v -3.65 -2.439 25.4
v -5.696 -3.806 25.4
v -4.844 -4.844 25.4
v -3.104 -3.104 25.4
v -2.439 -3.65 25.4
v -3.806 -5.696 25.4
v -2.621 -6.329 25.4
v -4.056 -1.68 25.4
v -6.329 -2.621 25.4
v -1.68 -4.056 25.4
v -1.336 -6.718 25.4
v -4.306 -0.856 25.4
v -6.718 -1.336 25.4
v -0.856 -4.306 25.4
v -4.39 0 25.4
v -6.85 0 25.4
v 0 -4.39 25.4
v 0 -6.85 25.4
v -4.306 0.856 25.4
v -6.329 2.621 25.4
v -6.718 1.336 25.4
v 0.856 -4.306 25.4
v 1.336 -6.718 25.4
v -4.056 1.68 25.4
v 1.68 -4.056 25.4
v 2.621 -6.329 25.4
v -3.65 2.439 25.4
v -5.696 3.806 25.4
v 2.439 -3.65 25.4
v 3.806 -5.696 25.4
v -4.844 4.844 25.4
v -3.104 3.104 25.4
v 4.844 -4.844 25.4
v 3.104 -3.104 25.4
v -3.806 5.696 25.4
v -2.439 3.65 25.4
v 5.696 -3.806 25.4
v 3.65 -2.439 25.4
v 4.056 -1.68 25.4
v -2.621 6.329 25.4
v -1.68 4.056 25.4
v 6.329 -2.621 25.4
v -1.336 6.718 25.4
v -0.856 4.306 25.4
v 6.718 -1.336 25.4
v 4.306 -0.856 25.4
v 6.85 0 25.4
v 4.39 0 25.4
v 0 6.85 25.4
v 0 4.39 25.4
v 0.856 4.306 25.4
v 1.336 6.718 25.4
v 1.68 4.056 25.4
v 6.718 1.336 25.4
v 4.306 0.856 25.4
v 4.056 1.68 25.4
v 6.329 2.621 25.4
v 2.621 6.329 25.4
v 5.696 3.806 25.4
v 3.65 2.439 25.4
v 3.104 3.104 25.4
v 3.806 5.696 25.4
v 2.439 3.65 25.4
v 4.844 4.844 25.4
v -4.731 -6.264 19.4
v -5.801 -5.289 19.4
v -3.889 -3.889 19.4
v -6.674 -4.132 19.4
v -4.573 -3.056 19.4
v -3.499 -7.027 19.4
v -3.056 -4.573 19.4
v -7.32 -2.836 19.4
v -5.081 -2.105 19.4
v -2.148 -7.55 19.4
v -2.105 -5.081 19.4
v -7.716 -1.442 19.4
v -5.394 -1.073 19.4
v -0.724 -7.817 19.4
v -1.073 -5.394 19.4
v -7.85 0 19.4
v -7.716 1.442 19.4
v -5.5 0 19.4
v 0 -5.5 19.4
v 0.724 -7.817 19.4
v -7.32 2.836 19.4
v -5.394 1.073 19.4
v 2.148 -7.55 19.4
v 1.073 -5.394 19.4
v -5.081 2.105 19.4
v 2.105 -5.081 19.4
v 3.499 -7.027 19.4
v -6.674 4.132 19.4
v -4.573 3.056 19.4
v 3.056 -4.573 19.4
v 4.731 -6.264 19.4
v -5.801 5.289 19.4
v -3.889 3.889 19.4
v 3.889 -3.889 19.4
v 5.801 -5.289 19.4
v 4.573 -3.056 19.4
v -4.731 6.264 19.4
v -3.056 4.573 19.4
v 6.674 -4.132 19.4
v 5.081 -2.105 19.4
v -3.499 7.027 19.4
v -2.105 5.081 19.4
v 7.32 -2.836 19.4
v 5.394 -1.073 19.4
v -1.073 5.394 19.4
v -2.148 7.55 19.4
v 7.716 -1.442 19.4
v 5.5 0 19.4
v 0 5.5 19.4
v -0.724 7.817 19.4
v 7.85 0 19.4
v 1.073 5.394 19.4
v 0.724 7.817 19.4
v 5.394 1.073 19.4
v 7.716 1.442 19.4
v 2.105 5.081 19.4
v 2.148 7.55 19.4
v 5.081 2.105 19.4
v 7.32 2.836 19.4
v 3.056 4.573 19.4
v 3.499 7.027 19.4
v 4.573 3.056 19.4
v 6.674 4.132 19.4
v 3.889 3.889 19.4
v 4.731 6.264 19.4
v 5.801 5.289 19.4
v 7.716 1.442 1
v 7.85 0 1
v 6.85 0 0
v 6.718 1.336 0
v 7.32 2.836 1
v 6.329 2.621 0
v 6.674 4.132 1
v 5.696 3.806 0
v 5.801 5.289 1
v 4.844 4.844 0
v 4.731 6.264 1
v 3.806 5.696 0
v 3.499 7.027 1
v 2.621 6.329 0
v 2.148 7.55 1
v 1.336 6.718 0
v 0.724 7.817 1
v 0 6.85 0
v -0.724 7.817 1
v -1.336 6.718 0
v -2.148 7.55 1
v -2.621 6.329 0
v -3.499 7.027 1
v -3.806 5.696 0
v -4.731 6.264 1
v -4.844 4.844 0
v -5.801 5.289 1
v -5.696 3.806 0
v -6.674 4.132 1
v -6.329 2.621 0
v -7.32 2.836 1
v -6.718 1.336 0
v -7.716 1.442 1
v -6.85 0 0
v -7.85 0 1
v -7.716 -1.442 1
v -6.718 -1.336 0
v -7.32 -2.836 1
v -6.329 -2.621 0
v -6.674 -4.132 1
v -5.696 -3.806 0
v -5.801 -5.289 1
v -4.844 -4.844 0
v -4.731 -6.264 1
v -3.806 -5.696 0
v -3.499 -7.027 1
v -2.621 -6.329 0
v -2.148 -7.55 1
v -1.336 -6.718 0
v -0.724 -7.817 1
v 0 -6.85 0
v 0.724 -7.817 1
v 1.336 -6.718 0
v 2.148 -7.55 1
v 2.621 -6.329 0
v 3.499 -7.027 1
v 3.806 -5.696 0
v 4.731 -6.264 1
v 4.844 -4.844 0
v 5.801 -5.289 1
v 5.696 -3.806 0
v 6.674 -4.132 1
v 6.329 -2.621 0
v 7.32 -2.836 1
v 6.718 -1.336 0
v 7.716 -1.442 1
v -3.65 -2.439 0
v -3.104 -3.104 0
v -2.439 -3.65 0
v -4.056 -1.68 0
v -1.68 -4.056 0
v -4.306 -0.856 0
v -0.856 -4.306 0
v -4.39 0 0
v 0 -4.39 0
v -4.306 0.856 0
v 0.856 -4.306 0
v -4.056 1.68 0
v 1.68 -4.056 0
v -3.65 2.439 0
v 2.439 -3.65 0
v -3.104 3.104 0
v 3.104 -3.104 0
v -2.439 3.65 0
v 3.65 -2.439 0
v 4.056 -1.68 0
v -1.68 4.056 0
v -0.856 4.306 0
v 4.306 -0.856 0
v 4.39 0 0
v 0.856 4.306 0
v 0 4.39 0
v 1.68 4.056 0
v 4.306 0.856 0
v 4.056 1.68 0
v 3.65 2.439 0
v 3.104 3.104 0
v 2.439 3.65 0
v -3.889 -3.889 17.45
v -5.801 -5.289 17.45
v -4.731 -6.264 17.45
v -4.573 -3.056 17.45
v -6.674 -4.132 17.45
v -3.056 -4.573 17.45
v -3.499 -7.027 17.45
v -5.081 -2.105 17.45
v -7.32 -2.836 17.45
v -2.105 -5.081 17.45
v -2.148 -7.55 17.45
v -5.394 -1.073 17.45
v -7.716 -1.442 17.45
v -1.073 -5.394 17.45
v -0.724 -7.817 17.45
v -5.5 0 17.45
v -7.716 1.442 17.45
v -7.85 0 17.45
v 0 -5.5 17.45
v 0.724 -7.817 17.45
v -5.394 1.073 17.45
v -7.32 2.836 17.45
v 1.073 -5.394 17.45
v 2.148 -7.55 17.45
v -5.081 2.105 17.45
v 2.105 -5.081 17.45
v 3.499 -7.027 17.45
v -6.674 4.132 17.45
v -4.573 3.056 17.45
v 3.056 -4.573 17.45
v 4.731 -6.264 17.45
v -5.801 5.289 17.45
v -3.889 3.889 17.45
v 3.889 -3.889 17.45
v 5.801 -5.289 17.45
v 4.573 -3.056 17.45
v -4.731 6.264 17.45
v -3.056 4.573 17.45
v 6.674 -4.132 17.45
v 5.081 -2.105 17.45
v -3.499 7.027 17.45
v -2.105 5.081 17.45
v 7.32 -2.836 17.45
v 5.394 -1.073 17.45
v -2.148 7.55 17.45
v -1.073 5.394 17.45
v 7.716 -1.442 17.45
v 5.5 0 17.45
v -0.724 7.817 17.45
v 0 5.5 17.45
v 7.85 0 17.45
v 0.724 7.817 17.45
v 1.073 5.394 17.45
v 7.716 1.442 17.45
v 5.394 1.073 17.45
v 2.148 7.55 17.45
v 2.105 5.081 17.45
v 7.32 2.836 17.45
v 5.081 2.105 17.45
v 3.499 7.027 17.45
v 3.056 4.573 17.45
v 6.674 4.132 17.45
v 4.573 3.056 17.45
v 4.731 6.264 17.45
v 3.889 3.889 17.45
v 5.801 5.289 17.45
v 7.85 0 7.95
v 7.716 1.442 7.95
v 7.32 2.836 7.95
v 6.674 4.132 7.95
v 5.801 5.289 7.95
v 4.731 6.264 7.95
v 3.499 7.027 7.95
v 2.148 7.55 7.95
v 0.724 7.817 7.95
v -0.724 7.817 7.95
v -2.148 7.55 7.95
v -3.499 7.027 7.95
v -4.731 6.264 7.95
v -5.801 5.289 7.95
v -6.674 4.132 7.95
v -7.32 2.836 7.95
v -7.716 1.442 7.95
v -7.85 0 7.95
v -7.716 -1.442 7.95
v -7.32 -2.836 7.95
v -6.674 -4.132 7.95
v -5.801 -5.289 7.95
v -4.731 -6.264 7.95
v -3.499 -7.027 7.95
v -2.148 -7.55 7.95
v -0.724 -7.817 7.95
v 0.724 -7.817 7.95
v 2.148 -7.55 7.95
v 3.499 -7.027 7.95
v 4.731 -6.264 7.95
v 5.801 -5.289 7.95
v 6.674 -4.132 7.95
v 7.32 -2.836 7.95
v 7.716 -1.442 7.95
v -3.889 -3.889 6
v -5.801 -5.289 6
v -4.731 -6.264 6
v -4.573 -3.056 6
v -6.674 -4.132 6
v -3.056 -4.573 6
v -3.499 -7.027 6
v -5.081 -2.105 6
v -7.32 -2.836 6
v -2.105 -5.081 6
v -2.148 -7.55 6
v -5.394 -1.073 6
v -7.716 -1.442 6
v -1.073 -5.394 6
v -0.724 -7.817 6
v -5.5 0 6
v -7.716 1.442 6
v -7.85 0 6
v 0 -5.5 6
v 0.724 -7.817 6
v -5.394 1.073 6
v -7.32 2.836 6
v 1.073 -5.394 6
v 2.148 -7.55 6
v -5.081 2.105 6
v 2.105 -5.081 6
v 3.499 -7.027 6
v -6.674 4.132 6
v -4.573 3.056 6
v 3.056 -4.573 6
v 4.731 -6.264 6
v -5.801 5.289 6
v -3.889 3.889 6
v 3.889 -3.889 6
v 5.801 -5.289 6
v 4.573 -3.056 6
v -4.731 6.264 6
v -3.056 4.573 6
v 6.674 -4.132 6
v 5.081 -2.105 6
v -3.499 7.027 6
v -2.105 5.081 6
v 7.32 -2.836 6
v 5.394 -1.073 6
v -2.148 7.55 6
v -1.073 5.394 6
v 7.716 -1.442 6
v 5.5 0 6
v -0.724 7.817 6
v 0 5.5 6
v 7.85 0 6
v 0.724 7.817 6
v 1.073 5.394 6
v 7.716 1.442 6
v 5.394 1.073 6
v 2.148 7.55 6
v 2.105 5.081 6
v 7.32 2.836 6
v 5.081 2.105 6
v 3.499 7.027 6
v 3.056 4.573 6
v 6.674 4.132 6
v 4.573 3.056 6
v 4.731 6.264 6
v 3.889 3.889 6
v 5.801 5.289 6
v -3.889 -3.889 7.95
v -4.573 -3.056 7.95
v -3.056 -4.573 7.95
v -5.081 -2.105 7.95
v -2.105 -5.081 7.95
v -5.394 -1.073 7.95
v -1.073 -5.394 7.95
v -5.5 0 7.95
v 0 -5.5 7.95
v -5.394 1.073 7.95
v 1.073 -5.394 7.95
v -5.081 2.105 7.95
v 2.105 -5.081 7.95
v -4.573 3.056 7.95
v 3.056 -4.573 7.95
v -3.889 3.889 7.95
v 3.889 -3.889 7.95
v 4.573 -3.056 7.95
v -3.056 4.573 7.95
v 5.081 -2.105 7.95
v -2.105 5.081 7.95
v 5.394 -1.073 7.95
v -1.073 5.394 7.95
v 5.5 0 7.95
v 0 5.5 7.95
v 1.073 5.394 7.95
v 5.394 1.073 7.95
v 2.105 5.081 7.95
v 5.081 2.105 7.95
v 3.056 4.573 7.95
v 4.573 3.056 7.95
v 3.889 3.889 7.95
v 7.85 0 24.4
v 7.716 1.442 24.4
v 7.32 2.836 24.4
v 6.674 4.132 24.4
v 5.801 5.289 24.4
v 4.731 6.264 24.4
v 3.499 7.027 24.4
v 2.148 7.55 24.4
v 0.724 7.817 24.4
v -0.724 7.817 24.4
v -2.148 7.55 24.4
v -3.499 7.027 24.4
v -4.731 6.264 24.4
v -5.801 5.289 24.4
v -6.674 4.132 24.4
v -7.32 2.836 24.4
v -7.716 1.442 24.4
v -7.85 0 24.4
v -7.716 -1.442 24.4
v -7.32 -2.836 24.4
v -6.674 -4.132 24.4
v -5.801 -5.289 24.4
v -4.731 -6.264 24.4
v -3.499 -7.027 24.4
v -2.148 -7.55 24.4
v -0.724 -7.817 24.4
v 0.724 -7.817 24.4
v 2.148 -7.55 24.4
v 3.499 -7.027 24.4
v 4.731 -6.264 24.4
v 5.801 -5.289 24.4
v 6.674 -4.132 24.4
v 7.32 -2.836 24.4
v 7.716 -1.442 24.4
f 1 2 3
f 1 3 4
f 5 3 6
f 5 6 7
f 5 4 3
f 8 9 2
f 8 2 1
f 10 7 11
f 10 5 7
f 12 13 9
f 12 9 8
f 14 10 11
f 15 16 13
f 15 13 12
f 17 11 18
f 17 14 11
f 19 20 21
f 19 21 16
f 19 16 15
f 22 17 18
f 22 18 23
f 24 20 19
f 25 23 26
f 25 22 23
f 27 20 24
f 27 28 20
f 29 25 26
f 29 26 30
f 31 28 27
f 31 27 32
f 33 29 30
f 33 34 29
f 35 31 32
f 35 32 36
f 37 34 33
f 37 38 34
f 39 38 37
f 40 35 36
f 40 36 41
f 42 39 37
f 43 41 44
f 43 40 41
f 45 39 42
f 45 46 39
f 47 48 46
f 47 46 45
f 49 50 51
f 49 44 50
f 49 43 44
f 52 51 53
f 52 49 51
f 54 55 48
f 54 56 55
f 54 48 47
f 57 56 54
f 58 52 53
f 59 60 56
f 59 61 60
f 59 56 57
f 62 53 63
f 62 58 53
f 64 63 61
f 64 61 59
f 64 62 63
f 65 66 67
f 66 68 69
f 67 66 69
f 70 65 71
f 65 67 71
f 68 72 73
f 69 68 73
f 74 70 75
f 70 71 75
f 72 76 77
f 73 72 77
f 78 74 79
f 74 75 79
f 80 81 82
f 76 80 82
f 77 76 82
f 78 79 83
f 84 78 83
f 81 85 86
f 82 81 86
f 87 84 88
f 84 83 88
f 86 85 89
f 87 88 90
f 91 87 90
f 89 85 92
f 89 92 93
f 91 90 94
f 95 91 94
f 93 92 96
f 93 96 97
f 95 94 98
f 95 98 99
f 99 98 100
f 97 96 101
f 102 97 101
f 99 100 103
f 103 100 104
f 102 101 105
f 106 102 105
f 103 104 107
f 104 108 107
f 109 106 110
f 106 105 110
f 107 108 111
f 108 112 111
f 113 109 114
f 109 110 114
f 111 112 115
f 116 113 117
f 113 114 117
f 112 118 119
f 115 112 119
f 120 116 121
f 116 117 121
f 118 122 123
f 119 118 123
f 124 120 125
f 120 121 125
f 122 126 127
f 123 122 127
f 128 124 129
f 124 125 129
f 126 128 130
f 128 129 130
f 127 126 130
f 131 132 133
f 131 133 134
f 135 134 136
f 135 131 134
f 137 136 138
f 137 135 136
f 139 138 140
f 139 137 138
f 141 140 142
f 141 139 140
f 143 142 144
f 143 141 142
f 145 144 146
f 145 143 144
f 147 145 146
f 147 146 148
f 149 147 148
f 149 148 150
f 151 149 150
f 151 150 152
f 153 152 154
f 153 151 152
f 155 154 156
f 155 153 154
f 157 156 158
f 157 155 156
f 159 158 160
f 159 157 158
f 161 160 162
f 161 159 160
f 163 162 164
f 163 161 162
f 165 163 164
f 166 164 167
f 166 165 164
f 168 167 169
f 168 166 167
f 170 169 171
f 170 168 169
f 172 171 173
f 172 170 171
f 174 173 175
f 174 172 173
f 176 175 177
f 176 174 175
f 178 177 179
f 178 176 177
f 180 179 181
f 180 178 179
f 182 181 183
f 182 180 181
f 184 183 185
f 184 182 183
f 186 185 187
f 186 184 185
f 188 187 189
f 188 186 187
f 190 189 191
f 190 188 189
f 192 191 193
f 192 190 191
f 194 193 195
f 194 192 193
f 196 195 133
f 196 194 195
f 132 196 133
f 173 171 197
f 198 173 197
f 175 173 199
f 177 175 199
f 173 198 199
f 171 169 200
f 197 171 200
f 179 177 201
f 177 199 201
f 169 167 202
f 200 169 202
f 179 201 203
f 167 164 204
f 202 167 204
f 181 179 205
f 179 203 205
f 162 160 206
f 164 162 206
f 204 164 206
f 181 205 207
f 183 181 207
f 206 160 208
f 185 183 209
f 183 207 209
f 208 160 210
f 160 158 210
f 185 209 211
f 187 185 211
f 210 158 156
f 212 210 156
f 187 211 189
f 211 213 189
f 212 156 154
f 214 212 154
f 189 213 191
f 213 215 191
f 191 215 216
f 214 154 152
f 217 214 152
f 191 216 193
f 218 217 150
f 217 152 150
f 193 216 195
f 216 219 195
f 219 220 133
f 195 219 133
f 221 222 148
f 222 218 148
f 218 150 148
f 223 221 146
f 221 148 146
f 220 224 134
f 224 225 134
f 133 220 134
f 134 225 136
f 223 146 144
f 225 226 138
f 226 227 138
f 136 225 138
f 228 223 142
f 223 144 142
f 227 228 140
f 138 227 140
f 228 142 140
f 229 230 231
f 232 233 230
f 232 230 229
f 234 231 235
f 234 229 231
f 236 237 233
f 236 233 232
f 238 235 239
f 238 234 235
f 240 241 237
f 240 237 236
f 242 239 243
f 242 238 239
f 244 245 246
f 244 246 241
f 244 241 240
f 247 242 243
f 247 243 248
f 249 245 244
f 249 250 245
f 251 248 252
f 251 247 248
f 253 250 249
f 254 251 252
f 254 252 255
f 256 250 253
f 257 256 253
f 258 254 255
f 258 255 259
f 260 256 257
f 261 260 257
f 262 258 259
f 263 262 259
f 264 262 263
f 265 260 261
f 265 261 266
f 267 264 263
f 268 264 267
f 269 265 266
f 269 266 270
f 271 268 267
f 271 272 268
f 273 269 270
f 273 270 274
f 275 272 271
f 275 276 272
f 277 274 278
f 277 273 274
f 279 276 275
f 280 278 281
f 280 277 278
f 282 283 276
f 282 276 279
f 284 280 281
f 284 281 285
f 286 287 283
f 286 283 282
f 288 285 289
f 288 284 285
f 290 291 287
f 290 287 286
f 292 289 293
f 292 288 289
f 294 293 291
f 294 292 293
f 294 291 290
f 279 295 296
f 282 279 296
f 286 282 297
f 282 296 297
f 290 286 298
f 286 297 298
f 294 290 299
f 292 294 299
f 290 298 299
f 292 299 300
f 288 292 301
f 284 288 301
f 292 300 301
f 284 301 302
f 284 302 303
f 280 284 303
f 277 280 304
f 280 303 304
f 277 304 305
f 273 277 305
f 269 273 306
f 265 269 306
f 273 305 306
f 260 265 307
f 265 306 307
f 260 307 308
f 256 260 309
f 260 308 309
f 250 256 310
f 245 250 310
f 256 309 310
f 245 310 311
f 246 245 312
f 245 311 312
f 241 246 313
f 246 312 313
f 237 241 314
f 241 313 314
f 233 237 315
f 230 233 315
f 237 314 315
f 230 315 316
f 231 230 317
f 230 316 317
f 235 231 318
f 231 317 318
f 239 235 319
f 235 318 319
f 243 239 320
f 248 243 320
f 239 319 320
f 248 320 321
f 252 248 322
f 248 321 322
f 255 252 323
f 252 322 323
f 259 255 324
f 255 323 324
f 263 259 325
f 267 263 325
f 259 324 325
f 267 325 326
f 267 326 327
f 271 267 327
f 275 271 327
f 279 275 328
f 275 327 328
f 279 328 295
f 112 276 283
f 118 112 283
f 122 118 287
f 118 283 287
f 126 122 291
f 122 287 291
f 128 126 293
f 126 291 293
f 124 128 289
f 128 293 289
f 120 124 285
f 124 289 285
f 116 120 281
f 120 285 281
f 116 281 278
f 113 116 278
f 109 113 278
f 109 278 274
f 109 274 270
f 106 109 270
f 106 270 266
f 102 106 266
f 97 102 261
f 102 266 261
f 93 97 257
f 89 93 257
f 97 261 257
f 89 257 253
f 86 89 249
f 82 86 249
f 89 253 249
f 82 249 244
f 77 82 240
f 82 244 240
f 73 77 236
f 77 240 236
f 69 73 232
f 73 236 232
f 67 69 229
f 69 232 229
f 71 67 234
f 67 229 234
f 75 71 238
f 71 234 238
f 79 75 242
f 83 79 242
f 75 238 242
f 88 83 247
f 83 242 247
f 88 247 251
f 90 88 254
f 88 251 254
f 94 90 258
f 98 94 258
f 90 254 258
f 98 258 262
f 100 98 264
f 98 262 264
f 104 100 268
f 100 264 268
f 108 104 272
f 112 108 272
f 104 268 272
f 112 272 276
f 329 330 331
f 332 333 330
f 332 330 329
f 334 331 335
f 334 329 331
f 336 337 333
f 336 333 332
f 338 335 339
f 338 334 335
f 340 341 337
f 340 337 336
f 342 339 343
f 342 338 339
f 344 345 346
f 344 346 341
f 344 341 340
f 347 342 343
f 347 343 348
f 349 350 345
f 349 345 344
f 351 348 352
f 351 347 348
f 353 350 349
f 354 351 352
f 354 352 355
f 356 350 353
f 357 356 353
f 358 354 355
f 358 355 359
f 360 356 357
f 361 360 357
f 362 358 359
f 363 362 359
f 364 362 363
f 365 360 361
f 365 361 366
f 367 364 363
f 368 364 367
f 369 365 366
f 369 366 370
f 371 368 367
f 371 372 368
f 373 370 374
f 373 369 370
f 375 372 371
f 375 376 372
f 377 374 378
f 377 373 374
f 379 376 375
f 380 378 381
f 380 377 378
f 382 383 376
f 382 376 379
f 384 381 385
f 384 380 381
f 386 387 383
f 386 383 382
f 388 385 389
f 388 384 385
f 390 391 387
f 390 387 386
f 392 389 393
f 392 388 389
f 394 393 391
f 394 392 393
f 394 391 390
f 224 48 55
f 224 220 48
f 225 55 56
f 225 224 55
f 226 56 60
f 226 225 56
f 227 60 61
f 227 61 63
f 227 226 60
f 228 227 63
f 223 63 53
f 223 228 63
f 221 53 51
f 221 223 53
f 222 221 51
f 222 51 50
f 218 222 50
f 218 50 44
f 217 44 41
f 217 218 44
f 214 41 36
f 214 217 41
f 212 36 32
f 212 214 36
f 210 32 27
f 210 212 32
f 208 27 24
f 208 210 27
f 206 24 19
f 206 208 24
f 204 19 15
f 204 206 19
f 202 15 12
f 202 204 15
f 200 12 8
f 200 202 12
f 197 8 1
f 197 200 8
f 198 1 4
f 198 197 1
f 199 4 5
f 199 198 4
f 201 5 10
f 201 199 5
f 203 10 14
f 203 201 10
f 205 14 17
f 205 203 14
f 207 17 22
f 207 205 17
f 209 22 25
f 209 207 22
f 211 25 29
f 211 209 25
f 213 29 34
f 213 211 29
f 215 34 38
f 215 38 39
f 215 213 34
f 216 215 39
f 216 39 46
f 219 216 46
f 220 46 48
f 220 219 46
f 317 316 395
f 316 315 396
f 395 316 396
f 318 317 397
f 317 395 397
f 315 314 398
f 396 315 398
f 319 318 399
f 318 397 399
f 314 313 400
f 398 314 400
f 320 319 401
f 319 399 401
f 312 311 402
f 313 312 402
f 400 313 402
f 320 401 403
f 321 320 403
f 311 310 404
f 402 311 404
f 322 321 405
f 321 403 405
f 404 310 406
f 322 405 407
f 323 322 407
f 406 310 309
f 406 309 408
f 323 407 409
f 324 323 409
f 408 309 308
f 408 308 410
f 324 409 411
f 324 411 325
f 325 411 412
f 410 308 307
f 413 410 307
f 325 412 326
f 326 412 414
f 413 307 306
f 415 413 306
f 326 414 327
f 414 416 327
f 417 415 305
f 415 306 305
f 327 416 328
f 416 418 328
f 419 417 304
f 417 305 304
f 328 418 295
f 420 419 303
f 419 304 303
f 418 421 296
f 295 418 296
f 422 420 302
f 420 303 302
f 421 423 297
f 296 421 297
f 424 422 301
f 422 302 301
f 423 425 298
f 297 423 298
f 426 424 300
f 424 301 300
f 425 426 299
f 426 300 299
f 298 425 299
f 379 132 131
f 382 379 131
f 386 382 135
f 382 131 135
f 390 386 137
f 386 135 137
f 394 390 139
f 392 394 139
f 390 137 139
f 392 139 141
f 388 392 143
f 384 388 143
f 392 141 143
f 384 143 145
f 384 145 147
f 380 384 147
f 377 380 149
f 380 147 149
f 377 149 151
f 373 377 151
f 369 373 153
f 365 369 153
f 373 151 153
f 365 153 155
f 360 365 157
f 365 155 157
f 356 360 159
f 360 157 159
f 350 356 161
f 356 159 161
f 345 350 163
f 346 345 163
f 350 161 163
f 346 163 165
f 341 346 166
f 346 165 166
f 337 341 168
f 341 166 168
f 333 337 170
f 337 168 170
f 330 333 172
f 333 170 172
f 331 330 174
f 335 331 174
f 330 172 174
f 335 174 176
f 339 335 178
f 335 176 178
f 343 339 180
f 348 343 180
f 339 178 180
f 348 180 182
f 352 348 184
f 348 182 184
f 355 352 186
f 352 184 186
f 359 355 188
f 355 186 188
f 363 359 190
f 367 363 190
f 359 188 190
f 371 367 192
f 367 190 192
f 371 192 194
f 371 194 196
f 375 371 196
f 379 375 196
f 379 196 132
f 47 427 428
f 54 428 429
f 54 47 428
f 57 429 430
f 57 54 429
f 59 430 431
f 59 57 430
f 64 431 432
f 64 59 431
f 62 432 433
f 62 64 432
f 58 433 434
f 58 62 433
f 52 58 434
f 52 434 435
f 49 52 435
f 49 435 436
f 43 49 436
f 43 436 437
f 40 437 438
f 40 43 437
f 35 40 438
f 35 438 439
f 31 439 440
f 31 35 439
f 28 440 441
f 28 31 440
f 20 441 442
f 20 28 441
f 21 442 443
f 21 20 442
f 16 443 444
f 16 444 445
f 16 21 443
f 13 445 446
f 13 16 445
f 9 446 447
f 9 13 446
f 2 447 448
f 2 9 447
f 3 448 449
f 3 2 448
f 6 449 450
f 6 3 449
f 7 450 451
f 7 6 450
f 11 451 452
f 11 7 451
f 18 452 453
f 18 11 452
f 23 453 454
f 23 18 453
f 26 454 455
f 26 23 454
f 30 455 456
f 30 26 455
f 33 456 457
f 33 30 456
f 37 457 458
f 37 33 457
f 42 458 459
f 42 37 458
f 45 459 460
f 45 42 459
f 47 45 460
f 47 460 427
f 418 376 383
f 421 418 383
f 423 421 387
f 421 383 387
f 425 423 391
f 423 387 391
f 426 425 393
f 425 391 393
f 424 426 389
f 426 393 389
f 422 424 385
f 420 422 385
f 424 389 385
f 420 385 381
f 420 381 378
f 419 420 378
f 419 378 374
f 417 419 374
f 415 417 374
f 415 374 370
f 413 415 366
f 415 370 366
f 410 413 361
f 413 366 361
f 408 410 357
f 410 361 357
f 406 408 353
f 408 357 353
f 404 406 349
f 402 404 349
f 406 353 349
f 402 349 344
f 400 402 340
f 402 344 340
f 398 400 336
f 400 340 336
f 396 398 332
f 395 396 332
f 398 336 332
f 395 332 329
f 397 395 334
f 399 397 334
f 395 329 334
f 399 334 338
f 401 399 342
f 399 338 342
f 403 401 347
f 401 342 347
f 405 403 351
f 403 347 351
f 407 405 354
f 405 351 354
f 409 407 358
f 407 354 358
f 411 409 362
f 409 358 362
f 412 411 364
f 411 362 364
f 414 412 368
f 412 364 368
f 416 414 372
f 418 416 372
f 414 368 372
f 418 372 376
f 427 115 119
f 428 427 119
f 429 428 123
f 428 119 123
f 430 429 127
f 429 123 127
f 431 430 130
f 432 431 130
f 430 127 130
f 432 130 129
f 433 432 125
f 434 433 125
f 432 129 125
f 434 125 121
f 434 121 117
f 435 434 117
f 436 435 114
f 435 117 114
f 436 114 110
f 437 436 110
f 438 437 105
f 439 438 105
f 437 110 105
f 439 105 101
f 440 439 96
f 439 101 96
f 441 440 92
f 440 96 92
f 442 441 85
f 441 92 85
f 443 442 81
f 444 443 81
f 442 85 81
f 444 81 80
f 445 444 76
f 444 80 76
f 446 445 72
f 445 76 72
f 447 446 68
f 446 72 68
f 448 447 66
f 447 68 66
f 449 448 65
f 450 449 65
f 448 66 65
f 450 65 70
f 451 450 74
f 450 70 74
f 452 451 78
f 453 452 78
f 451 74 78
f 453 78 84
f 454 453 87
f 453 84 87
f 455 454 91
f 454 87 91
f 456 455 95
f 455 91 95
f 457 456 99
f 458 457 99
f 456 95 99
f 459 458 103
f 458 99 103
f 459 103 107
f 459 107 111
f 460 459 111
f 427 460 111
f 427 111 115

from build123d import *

# Parameters (mm, degrees)
F0_R      = 7.85
F0_R_2    = 4.39
F1_DEPTH  = 6
F2_R      = 5.5
F2_R_2    = 4.39
F3_DEPTH  = 1.95
F4_R      = 7.85
F4_R_2    = 5.5
F5_DEPTH  = 9.5
F6_DEPTH  = 9.5
F8_R      = 5.5
F8_R_2    = 4.39
F9_DEPTH  = 1.95
F10_R     = 7.85
F10_R_2   = 5.5
F10_R_3   = 4.39
F11_DEPTH = 6
F12_SIZE  = 1
F13_SIZE  = 1


with BuildPart() as f1:
    # F0 (on Top) → F1 (new body)
    with BuildSketch(Plane.XY):
        Circle(F0_R)
        Circle(F0_R_2, mode=Mode.SUBTRACT)
    extrude(amount=F1_DEPTH)

    # F2 (on face) → F3 (join)
    with BuildSketch(Plane.XY.offset(6)):
        Circle(F2_R)
        Circle(F2_R_2, mode=Mode.SUBTRACT)
    extrude(amount=F3_DEPTH)


with BuildPart() as f5:
    # F4 (on face) → F5 (new body)
    with BuildSketch(Plane.XY.offset(7.95)):
        Circle(F4_R)
        Circle(F4_R_2, mode=Mode.SUBTRACT)
    extrude(amount=F5_DEPTH)


with BuildPart() as f6:
    # F6 (new): a face of the model
    f6_faces = [f1.part.faces().sort_by_distance(p)[0] for p in [
        (-5.3444365081, 0, 7.95),
    ]]
    extrude(f6_faces, amount=F6_DEPTH)


with BuildPart() as f1_1:
    add(f1.part)

    # F7: union F5, F6
    add(f5.part)
    add(f6.part)

    # F8 (on face) → F9 (join)
    with BuildSketch(Plane.XY.offset(17.45)):
        Circle(F8_R)
        Circle(F8_R_2, mode=Mode.SUBTRACT)
    extrude(amount=F9_DEPTH)

    # F10 (on face) → F11 (join)
    with BuildSketch(Plane.XY.offset(19.4)):
        Circle(F10_R)
        Circle(F10_R_2, mode=Mode.SUBTRACT)
        Circle(F10_R_2)
        Circle(F10_R_3, mode=Mode.SUBTRACT)
    extrude(amount=F11_DEPTH)

    # F12
    f12_edges = [f1_1.edges().sort_by_distance(p)[0] for p in [
        (-7.85, 0, 25.4),
    ]]
    chamfer(f12_edges, length=F12_SIZE)

    # F13
    f13_edges = [f1_1.edges().sort_by_distance(p)[0] for p in [
        (-7.85, 0, 0),
    ]]
    chamfer(f13_edges, length=F13_SIZE)


solid = f1_1.part
